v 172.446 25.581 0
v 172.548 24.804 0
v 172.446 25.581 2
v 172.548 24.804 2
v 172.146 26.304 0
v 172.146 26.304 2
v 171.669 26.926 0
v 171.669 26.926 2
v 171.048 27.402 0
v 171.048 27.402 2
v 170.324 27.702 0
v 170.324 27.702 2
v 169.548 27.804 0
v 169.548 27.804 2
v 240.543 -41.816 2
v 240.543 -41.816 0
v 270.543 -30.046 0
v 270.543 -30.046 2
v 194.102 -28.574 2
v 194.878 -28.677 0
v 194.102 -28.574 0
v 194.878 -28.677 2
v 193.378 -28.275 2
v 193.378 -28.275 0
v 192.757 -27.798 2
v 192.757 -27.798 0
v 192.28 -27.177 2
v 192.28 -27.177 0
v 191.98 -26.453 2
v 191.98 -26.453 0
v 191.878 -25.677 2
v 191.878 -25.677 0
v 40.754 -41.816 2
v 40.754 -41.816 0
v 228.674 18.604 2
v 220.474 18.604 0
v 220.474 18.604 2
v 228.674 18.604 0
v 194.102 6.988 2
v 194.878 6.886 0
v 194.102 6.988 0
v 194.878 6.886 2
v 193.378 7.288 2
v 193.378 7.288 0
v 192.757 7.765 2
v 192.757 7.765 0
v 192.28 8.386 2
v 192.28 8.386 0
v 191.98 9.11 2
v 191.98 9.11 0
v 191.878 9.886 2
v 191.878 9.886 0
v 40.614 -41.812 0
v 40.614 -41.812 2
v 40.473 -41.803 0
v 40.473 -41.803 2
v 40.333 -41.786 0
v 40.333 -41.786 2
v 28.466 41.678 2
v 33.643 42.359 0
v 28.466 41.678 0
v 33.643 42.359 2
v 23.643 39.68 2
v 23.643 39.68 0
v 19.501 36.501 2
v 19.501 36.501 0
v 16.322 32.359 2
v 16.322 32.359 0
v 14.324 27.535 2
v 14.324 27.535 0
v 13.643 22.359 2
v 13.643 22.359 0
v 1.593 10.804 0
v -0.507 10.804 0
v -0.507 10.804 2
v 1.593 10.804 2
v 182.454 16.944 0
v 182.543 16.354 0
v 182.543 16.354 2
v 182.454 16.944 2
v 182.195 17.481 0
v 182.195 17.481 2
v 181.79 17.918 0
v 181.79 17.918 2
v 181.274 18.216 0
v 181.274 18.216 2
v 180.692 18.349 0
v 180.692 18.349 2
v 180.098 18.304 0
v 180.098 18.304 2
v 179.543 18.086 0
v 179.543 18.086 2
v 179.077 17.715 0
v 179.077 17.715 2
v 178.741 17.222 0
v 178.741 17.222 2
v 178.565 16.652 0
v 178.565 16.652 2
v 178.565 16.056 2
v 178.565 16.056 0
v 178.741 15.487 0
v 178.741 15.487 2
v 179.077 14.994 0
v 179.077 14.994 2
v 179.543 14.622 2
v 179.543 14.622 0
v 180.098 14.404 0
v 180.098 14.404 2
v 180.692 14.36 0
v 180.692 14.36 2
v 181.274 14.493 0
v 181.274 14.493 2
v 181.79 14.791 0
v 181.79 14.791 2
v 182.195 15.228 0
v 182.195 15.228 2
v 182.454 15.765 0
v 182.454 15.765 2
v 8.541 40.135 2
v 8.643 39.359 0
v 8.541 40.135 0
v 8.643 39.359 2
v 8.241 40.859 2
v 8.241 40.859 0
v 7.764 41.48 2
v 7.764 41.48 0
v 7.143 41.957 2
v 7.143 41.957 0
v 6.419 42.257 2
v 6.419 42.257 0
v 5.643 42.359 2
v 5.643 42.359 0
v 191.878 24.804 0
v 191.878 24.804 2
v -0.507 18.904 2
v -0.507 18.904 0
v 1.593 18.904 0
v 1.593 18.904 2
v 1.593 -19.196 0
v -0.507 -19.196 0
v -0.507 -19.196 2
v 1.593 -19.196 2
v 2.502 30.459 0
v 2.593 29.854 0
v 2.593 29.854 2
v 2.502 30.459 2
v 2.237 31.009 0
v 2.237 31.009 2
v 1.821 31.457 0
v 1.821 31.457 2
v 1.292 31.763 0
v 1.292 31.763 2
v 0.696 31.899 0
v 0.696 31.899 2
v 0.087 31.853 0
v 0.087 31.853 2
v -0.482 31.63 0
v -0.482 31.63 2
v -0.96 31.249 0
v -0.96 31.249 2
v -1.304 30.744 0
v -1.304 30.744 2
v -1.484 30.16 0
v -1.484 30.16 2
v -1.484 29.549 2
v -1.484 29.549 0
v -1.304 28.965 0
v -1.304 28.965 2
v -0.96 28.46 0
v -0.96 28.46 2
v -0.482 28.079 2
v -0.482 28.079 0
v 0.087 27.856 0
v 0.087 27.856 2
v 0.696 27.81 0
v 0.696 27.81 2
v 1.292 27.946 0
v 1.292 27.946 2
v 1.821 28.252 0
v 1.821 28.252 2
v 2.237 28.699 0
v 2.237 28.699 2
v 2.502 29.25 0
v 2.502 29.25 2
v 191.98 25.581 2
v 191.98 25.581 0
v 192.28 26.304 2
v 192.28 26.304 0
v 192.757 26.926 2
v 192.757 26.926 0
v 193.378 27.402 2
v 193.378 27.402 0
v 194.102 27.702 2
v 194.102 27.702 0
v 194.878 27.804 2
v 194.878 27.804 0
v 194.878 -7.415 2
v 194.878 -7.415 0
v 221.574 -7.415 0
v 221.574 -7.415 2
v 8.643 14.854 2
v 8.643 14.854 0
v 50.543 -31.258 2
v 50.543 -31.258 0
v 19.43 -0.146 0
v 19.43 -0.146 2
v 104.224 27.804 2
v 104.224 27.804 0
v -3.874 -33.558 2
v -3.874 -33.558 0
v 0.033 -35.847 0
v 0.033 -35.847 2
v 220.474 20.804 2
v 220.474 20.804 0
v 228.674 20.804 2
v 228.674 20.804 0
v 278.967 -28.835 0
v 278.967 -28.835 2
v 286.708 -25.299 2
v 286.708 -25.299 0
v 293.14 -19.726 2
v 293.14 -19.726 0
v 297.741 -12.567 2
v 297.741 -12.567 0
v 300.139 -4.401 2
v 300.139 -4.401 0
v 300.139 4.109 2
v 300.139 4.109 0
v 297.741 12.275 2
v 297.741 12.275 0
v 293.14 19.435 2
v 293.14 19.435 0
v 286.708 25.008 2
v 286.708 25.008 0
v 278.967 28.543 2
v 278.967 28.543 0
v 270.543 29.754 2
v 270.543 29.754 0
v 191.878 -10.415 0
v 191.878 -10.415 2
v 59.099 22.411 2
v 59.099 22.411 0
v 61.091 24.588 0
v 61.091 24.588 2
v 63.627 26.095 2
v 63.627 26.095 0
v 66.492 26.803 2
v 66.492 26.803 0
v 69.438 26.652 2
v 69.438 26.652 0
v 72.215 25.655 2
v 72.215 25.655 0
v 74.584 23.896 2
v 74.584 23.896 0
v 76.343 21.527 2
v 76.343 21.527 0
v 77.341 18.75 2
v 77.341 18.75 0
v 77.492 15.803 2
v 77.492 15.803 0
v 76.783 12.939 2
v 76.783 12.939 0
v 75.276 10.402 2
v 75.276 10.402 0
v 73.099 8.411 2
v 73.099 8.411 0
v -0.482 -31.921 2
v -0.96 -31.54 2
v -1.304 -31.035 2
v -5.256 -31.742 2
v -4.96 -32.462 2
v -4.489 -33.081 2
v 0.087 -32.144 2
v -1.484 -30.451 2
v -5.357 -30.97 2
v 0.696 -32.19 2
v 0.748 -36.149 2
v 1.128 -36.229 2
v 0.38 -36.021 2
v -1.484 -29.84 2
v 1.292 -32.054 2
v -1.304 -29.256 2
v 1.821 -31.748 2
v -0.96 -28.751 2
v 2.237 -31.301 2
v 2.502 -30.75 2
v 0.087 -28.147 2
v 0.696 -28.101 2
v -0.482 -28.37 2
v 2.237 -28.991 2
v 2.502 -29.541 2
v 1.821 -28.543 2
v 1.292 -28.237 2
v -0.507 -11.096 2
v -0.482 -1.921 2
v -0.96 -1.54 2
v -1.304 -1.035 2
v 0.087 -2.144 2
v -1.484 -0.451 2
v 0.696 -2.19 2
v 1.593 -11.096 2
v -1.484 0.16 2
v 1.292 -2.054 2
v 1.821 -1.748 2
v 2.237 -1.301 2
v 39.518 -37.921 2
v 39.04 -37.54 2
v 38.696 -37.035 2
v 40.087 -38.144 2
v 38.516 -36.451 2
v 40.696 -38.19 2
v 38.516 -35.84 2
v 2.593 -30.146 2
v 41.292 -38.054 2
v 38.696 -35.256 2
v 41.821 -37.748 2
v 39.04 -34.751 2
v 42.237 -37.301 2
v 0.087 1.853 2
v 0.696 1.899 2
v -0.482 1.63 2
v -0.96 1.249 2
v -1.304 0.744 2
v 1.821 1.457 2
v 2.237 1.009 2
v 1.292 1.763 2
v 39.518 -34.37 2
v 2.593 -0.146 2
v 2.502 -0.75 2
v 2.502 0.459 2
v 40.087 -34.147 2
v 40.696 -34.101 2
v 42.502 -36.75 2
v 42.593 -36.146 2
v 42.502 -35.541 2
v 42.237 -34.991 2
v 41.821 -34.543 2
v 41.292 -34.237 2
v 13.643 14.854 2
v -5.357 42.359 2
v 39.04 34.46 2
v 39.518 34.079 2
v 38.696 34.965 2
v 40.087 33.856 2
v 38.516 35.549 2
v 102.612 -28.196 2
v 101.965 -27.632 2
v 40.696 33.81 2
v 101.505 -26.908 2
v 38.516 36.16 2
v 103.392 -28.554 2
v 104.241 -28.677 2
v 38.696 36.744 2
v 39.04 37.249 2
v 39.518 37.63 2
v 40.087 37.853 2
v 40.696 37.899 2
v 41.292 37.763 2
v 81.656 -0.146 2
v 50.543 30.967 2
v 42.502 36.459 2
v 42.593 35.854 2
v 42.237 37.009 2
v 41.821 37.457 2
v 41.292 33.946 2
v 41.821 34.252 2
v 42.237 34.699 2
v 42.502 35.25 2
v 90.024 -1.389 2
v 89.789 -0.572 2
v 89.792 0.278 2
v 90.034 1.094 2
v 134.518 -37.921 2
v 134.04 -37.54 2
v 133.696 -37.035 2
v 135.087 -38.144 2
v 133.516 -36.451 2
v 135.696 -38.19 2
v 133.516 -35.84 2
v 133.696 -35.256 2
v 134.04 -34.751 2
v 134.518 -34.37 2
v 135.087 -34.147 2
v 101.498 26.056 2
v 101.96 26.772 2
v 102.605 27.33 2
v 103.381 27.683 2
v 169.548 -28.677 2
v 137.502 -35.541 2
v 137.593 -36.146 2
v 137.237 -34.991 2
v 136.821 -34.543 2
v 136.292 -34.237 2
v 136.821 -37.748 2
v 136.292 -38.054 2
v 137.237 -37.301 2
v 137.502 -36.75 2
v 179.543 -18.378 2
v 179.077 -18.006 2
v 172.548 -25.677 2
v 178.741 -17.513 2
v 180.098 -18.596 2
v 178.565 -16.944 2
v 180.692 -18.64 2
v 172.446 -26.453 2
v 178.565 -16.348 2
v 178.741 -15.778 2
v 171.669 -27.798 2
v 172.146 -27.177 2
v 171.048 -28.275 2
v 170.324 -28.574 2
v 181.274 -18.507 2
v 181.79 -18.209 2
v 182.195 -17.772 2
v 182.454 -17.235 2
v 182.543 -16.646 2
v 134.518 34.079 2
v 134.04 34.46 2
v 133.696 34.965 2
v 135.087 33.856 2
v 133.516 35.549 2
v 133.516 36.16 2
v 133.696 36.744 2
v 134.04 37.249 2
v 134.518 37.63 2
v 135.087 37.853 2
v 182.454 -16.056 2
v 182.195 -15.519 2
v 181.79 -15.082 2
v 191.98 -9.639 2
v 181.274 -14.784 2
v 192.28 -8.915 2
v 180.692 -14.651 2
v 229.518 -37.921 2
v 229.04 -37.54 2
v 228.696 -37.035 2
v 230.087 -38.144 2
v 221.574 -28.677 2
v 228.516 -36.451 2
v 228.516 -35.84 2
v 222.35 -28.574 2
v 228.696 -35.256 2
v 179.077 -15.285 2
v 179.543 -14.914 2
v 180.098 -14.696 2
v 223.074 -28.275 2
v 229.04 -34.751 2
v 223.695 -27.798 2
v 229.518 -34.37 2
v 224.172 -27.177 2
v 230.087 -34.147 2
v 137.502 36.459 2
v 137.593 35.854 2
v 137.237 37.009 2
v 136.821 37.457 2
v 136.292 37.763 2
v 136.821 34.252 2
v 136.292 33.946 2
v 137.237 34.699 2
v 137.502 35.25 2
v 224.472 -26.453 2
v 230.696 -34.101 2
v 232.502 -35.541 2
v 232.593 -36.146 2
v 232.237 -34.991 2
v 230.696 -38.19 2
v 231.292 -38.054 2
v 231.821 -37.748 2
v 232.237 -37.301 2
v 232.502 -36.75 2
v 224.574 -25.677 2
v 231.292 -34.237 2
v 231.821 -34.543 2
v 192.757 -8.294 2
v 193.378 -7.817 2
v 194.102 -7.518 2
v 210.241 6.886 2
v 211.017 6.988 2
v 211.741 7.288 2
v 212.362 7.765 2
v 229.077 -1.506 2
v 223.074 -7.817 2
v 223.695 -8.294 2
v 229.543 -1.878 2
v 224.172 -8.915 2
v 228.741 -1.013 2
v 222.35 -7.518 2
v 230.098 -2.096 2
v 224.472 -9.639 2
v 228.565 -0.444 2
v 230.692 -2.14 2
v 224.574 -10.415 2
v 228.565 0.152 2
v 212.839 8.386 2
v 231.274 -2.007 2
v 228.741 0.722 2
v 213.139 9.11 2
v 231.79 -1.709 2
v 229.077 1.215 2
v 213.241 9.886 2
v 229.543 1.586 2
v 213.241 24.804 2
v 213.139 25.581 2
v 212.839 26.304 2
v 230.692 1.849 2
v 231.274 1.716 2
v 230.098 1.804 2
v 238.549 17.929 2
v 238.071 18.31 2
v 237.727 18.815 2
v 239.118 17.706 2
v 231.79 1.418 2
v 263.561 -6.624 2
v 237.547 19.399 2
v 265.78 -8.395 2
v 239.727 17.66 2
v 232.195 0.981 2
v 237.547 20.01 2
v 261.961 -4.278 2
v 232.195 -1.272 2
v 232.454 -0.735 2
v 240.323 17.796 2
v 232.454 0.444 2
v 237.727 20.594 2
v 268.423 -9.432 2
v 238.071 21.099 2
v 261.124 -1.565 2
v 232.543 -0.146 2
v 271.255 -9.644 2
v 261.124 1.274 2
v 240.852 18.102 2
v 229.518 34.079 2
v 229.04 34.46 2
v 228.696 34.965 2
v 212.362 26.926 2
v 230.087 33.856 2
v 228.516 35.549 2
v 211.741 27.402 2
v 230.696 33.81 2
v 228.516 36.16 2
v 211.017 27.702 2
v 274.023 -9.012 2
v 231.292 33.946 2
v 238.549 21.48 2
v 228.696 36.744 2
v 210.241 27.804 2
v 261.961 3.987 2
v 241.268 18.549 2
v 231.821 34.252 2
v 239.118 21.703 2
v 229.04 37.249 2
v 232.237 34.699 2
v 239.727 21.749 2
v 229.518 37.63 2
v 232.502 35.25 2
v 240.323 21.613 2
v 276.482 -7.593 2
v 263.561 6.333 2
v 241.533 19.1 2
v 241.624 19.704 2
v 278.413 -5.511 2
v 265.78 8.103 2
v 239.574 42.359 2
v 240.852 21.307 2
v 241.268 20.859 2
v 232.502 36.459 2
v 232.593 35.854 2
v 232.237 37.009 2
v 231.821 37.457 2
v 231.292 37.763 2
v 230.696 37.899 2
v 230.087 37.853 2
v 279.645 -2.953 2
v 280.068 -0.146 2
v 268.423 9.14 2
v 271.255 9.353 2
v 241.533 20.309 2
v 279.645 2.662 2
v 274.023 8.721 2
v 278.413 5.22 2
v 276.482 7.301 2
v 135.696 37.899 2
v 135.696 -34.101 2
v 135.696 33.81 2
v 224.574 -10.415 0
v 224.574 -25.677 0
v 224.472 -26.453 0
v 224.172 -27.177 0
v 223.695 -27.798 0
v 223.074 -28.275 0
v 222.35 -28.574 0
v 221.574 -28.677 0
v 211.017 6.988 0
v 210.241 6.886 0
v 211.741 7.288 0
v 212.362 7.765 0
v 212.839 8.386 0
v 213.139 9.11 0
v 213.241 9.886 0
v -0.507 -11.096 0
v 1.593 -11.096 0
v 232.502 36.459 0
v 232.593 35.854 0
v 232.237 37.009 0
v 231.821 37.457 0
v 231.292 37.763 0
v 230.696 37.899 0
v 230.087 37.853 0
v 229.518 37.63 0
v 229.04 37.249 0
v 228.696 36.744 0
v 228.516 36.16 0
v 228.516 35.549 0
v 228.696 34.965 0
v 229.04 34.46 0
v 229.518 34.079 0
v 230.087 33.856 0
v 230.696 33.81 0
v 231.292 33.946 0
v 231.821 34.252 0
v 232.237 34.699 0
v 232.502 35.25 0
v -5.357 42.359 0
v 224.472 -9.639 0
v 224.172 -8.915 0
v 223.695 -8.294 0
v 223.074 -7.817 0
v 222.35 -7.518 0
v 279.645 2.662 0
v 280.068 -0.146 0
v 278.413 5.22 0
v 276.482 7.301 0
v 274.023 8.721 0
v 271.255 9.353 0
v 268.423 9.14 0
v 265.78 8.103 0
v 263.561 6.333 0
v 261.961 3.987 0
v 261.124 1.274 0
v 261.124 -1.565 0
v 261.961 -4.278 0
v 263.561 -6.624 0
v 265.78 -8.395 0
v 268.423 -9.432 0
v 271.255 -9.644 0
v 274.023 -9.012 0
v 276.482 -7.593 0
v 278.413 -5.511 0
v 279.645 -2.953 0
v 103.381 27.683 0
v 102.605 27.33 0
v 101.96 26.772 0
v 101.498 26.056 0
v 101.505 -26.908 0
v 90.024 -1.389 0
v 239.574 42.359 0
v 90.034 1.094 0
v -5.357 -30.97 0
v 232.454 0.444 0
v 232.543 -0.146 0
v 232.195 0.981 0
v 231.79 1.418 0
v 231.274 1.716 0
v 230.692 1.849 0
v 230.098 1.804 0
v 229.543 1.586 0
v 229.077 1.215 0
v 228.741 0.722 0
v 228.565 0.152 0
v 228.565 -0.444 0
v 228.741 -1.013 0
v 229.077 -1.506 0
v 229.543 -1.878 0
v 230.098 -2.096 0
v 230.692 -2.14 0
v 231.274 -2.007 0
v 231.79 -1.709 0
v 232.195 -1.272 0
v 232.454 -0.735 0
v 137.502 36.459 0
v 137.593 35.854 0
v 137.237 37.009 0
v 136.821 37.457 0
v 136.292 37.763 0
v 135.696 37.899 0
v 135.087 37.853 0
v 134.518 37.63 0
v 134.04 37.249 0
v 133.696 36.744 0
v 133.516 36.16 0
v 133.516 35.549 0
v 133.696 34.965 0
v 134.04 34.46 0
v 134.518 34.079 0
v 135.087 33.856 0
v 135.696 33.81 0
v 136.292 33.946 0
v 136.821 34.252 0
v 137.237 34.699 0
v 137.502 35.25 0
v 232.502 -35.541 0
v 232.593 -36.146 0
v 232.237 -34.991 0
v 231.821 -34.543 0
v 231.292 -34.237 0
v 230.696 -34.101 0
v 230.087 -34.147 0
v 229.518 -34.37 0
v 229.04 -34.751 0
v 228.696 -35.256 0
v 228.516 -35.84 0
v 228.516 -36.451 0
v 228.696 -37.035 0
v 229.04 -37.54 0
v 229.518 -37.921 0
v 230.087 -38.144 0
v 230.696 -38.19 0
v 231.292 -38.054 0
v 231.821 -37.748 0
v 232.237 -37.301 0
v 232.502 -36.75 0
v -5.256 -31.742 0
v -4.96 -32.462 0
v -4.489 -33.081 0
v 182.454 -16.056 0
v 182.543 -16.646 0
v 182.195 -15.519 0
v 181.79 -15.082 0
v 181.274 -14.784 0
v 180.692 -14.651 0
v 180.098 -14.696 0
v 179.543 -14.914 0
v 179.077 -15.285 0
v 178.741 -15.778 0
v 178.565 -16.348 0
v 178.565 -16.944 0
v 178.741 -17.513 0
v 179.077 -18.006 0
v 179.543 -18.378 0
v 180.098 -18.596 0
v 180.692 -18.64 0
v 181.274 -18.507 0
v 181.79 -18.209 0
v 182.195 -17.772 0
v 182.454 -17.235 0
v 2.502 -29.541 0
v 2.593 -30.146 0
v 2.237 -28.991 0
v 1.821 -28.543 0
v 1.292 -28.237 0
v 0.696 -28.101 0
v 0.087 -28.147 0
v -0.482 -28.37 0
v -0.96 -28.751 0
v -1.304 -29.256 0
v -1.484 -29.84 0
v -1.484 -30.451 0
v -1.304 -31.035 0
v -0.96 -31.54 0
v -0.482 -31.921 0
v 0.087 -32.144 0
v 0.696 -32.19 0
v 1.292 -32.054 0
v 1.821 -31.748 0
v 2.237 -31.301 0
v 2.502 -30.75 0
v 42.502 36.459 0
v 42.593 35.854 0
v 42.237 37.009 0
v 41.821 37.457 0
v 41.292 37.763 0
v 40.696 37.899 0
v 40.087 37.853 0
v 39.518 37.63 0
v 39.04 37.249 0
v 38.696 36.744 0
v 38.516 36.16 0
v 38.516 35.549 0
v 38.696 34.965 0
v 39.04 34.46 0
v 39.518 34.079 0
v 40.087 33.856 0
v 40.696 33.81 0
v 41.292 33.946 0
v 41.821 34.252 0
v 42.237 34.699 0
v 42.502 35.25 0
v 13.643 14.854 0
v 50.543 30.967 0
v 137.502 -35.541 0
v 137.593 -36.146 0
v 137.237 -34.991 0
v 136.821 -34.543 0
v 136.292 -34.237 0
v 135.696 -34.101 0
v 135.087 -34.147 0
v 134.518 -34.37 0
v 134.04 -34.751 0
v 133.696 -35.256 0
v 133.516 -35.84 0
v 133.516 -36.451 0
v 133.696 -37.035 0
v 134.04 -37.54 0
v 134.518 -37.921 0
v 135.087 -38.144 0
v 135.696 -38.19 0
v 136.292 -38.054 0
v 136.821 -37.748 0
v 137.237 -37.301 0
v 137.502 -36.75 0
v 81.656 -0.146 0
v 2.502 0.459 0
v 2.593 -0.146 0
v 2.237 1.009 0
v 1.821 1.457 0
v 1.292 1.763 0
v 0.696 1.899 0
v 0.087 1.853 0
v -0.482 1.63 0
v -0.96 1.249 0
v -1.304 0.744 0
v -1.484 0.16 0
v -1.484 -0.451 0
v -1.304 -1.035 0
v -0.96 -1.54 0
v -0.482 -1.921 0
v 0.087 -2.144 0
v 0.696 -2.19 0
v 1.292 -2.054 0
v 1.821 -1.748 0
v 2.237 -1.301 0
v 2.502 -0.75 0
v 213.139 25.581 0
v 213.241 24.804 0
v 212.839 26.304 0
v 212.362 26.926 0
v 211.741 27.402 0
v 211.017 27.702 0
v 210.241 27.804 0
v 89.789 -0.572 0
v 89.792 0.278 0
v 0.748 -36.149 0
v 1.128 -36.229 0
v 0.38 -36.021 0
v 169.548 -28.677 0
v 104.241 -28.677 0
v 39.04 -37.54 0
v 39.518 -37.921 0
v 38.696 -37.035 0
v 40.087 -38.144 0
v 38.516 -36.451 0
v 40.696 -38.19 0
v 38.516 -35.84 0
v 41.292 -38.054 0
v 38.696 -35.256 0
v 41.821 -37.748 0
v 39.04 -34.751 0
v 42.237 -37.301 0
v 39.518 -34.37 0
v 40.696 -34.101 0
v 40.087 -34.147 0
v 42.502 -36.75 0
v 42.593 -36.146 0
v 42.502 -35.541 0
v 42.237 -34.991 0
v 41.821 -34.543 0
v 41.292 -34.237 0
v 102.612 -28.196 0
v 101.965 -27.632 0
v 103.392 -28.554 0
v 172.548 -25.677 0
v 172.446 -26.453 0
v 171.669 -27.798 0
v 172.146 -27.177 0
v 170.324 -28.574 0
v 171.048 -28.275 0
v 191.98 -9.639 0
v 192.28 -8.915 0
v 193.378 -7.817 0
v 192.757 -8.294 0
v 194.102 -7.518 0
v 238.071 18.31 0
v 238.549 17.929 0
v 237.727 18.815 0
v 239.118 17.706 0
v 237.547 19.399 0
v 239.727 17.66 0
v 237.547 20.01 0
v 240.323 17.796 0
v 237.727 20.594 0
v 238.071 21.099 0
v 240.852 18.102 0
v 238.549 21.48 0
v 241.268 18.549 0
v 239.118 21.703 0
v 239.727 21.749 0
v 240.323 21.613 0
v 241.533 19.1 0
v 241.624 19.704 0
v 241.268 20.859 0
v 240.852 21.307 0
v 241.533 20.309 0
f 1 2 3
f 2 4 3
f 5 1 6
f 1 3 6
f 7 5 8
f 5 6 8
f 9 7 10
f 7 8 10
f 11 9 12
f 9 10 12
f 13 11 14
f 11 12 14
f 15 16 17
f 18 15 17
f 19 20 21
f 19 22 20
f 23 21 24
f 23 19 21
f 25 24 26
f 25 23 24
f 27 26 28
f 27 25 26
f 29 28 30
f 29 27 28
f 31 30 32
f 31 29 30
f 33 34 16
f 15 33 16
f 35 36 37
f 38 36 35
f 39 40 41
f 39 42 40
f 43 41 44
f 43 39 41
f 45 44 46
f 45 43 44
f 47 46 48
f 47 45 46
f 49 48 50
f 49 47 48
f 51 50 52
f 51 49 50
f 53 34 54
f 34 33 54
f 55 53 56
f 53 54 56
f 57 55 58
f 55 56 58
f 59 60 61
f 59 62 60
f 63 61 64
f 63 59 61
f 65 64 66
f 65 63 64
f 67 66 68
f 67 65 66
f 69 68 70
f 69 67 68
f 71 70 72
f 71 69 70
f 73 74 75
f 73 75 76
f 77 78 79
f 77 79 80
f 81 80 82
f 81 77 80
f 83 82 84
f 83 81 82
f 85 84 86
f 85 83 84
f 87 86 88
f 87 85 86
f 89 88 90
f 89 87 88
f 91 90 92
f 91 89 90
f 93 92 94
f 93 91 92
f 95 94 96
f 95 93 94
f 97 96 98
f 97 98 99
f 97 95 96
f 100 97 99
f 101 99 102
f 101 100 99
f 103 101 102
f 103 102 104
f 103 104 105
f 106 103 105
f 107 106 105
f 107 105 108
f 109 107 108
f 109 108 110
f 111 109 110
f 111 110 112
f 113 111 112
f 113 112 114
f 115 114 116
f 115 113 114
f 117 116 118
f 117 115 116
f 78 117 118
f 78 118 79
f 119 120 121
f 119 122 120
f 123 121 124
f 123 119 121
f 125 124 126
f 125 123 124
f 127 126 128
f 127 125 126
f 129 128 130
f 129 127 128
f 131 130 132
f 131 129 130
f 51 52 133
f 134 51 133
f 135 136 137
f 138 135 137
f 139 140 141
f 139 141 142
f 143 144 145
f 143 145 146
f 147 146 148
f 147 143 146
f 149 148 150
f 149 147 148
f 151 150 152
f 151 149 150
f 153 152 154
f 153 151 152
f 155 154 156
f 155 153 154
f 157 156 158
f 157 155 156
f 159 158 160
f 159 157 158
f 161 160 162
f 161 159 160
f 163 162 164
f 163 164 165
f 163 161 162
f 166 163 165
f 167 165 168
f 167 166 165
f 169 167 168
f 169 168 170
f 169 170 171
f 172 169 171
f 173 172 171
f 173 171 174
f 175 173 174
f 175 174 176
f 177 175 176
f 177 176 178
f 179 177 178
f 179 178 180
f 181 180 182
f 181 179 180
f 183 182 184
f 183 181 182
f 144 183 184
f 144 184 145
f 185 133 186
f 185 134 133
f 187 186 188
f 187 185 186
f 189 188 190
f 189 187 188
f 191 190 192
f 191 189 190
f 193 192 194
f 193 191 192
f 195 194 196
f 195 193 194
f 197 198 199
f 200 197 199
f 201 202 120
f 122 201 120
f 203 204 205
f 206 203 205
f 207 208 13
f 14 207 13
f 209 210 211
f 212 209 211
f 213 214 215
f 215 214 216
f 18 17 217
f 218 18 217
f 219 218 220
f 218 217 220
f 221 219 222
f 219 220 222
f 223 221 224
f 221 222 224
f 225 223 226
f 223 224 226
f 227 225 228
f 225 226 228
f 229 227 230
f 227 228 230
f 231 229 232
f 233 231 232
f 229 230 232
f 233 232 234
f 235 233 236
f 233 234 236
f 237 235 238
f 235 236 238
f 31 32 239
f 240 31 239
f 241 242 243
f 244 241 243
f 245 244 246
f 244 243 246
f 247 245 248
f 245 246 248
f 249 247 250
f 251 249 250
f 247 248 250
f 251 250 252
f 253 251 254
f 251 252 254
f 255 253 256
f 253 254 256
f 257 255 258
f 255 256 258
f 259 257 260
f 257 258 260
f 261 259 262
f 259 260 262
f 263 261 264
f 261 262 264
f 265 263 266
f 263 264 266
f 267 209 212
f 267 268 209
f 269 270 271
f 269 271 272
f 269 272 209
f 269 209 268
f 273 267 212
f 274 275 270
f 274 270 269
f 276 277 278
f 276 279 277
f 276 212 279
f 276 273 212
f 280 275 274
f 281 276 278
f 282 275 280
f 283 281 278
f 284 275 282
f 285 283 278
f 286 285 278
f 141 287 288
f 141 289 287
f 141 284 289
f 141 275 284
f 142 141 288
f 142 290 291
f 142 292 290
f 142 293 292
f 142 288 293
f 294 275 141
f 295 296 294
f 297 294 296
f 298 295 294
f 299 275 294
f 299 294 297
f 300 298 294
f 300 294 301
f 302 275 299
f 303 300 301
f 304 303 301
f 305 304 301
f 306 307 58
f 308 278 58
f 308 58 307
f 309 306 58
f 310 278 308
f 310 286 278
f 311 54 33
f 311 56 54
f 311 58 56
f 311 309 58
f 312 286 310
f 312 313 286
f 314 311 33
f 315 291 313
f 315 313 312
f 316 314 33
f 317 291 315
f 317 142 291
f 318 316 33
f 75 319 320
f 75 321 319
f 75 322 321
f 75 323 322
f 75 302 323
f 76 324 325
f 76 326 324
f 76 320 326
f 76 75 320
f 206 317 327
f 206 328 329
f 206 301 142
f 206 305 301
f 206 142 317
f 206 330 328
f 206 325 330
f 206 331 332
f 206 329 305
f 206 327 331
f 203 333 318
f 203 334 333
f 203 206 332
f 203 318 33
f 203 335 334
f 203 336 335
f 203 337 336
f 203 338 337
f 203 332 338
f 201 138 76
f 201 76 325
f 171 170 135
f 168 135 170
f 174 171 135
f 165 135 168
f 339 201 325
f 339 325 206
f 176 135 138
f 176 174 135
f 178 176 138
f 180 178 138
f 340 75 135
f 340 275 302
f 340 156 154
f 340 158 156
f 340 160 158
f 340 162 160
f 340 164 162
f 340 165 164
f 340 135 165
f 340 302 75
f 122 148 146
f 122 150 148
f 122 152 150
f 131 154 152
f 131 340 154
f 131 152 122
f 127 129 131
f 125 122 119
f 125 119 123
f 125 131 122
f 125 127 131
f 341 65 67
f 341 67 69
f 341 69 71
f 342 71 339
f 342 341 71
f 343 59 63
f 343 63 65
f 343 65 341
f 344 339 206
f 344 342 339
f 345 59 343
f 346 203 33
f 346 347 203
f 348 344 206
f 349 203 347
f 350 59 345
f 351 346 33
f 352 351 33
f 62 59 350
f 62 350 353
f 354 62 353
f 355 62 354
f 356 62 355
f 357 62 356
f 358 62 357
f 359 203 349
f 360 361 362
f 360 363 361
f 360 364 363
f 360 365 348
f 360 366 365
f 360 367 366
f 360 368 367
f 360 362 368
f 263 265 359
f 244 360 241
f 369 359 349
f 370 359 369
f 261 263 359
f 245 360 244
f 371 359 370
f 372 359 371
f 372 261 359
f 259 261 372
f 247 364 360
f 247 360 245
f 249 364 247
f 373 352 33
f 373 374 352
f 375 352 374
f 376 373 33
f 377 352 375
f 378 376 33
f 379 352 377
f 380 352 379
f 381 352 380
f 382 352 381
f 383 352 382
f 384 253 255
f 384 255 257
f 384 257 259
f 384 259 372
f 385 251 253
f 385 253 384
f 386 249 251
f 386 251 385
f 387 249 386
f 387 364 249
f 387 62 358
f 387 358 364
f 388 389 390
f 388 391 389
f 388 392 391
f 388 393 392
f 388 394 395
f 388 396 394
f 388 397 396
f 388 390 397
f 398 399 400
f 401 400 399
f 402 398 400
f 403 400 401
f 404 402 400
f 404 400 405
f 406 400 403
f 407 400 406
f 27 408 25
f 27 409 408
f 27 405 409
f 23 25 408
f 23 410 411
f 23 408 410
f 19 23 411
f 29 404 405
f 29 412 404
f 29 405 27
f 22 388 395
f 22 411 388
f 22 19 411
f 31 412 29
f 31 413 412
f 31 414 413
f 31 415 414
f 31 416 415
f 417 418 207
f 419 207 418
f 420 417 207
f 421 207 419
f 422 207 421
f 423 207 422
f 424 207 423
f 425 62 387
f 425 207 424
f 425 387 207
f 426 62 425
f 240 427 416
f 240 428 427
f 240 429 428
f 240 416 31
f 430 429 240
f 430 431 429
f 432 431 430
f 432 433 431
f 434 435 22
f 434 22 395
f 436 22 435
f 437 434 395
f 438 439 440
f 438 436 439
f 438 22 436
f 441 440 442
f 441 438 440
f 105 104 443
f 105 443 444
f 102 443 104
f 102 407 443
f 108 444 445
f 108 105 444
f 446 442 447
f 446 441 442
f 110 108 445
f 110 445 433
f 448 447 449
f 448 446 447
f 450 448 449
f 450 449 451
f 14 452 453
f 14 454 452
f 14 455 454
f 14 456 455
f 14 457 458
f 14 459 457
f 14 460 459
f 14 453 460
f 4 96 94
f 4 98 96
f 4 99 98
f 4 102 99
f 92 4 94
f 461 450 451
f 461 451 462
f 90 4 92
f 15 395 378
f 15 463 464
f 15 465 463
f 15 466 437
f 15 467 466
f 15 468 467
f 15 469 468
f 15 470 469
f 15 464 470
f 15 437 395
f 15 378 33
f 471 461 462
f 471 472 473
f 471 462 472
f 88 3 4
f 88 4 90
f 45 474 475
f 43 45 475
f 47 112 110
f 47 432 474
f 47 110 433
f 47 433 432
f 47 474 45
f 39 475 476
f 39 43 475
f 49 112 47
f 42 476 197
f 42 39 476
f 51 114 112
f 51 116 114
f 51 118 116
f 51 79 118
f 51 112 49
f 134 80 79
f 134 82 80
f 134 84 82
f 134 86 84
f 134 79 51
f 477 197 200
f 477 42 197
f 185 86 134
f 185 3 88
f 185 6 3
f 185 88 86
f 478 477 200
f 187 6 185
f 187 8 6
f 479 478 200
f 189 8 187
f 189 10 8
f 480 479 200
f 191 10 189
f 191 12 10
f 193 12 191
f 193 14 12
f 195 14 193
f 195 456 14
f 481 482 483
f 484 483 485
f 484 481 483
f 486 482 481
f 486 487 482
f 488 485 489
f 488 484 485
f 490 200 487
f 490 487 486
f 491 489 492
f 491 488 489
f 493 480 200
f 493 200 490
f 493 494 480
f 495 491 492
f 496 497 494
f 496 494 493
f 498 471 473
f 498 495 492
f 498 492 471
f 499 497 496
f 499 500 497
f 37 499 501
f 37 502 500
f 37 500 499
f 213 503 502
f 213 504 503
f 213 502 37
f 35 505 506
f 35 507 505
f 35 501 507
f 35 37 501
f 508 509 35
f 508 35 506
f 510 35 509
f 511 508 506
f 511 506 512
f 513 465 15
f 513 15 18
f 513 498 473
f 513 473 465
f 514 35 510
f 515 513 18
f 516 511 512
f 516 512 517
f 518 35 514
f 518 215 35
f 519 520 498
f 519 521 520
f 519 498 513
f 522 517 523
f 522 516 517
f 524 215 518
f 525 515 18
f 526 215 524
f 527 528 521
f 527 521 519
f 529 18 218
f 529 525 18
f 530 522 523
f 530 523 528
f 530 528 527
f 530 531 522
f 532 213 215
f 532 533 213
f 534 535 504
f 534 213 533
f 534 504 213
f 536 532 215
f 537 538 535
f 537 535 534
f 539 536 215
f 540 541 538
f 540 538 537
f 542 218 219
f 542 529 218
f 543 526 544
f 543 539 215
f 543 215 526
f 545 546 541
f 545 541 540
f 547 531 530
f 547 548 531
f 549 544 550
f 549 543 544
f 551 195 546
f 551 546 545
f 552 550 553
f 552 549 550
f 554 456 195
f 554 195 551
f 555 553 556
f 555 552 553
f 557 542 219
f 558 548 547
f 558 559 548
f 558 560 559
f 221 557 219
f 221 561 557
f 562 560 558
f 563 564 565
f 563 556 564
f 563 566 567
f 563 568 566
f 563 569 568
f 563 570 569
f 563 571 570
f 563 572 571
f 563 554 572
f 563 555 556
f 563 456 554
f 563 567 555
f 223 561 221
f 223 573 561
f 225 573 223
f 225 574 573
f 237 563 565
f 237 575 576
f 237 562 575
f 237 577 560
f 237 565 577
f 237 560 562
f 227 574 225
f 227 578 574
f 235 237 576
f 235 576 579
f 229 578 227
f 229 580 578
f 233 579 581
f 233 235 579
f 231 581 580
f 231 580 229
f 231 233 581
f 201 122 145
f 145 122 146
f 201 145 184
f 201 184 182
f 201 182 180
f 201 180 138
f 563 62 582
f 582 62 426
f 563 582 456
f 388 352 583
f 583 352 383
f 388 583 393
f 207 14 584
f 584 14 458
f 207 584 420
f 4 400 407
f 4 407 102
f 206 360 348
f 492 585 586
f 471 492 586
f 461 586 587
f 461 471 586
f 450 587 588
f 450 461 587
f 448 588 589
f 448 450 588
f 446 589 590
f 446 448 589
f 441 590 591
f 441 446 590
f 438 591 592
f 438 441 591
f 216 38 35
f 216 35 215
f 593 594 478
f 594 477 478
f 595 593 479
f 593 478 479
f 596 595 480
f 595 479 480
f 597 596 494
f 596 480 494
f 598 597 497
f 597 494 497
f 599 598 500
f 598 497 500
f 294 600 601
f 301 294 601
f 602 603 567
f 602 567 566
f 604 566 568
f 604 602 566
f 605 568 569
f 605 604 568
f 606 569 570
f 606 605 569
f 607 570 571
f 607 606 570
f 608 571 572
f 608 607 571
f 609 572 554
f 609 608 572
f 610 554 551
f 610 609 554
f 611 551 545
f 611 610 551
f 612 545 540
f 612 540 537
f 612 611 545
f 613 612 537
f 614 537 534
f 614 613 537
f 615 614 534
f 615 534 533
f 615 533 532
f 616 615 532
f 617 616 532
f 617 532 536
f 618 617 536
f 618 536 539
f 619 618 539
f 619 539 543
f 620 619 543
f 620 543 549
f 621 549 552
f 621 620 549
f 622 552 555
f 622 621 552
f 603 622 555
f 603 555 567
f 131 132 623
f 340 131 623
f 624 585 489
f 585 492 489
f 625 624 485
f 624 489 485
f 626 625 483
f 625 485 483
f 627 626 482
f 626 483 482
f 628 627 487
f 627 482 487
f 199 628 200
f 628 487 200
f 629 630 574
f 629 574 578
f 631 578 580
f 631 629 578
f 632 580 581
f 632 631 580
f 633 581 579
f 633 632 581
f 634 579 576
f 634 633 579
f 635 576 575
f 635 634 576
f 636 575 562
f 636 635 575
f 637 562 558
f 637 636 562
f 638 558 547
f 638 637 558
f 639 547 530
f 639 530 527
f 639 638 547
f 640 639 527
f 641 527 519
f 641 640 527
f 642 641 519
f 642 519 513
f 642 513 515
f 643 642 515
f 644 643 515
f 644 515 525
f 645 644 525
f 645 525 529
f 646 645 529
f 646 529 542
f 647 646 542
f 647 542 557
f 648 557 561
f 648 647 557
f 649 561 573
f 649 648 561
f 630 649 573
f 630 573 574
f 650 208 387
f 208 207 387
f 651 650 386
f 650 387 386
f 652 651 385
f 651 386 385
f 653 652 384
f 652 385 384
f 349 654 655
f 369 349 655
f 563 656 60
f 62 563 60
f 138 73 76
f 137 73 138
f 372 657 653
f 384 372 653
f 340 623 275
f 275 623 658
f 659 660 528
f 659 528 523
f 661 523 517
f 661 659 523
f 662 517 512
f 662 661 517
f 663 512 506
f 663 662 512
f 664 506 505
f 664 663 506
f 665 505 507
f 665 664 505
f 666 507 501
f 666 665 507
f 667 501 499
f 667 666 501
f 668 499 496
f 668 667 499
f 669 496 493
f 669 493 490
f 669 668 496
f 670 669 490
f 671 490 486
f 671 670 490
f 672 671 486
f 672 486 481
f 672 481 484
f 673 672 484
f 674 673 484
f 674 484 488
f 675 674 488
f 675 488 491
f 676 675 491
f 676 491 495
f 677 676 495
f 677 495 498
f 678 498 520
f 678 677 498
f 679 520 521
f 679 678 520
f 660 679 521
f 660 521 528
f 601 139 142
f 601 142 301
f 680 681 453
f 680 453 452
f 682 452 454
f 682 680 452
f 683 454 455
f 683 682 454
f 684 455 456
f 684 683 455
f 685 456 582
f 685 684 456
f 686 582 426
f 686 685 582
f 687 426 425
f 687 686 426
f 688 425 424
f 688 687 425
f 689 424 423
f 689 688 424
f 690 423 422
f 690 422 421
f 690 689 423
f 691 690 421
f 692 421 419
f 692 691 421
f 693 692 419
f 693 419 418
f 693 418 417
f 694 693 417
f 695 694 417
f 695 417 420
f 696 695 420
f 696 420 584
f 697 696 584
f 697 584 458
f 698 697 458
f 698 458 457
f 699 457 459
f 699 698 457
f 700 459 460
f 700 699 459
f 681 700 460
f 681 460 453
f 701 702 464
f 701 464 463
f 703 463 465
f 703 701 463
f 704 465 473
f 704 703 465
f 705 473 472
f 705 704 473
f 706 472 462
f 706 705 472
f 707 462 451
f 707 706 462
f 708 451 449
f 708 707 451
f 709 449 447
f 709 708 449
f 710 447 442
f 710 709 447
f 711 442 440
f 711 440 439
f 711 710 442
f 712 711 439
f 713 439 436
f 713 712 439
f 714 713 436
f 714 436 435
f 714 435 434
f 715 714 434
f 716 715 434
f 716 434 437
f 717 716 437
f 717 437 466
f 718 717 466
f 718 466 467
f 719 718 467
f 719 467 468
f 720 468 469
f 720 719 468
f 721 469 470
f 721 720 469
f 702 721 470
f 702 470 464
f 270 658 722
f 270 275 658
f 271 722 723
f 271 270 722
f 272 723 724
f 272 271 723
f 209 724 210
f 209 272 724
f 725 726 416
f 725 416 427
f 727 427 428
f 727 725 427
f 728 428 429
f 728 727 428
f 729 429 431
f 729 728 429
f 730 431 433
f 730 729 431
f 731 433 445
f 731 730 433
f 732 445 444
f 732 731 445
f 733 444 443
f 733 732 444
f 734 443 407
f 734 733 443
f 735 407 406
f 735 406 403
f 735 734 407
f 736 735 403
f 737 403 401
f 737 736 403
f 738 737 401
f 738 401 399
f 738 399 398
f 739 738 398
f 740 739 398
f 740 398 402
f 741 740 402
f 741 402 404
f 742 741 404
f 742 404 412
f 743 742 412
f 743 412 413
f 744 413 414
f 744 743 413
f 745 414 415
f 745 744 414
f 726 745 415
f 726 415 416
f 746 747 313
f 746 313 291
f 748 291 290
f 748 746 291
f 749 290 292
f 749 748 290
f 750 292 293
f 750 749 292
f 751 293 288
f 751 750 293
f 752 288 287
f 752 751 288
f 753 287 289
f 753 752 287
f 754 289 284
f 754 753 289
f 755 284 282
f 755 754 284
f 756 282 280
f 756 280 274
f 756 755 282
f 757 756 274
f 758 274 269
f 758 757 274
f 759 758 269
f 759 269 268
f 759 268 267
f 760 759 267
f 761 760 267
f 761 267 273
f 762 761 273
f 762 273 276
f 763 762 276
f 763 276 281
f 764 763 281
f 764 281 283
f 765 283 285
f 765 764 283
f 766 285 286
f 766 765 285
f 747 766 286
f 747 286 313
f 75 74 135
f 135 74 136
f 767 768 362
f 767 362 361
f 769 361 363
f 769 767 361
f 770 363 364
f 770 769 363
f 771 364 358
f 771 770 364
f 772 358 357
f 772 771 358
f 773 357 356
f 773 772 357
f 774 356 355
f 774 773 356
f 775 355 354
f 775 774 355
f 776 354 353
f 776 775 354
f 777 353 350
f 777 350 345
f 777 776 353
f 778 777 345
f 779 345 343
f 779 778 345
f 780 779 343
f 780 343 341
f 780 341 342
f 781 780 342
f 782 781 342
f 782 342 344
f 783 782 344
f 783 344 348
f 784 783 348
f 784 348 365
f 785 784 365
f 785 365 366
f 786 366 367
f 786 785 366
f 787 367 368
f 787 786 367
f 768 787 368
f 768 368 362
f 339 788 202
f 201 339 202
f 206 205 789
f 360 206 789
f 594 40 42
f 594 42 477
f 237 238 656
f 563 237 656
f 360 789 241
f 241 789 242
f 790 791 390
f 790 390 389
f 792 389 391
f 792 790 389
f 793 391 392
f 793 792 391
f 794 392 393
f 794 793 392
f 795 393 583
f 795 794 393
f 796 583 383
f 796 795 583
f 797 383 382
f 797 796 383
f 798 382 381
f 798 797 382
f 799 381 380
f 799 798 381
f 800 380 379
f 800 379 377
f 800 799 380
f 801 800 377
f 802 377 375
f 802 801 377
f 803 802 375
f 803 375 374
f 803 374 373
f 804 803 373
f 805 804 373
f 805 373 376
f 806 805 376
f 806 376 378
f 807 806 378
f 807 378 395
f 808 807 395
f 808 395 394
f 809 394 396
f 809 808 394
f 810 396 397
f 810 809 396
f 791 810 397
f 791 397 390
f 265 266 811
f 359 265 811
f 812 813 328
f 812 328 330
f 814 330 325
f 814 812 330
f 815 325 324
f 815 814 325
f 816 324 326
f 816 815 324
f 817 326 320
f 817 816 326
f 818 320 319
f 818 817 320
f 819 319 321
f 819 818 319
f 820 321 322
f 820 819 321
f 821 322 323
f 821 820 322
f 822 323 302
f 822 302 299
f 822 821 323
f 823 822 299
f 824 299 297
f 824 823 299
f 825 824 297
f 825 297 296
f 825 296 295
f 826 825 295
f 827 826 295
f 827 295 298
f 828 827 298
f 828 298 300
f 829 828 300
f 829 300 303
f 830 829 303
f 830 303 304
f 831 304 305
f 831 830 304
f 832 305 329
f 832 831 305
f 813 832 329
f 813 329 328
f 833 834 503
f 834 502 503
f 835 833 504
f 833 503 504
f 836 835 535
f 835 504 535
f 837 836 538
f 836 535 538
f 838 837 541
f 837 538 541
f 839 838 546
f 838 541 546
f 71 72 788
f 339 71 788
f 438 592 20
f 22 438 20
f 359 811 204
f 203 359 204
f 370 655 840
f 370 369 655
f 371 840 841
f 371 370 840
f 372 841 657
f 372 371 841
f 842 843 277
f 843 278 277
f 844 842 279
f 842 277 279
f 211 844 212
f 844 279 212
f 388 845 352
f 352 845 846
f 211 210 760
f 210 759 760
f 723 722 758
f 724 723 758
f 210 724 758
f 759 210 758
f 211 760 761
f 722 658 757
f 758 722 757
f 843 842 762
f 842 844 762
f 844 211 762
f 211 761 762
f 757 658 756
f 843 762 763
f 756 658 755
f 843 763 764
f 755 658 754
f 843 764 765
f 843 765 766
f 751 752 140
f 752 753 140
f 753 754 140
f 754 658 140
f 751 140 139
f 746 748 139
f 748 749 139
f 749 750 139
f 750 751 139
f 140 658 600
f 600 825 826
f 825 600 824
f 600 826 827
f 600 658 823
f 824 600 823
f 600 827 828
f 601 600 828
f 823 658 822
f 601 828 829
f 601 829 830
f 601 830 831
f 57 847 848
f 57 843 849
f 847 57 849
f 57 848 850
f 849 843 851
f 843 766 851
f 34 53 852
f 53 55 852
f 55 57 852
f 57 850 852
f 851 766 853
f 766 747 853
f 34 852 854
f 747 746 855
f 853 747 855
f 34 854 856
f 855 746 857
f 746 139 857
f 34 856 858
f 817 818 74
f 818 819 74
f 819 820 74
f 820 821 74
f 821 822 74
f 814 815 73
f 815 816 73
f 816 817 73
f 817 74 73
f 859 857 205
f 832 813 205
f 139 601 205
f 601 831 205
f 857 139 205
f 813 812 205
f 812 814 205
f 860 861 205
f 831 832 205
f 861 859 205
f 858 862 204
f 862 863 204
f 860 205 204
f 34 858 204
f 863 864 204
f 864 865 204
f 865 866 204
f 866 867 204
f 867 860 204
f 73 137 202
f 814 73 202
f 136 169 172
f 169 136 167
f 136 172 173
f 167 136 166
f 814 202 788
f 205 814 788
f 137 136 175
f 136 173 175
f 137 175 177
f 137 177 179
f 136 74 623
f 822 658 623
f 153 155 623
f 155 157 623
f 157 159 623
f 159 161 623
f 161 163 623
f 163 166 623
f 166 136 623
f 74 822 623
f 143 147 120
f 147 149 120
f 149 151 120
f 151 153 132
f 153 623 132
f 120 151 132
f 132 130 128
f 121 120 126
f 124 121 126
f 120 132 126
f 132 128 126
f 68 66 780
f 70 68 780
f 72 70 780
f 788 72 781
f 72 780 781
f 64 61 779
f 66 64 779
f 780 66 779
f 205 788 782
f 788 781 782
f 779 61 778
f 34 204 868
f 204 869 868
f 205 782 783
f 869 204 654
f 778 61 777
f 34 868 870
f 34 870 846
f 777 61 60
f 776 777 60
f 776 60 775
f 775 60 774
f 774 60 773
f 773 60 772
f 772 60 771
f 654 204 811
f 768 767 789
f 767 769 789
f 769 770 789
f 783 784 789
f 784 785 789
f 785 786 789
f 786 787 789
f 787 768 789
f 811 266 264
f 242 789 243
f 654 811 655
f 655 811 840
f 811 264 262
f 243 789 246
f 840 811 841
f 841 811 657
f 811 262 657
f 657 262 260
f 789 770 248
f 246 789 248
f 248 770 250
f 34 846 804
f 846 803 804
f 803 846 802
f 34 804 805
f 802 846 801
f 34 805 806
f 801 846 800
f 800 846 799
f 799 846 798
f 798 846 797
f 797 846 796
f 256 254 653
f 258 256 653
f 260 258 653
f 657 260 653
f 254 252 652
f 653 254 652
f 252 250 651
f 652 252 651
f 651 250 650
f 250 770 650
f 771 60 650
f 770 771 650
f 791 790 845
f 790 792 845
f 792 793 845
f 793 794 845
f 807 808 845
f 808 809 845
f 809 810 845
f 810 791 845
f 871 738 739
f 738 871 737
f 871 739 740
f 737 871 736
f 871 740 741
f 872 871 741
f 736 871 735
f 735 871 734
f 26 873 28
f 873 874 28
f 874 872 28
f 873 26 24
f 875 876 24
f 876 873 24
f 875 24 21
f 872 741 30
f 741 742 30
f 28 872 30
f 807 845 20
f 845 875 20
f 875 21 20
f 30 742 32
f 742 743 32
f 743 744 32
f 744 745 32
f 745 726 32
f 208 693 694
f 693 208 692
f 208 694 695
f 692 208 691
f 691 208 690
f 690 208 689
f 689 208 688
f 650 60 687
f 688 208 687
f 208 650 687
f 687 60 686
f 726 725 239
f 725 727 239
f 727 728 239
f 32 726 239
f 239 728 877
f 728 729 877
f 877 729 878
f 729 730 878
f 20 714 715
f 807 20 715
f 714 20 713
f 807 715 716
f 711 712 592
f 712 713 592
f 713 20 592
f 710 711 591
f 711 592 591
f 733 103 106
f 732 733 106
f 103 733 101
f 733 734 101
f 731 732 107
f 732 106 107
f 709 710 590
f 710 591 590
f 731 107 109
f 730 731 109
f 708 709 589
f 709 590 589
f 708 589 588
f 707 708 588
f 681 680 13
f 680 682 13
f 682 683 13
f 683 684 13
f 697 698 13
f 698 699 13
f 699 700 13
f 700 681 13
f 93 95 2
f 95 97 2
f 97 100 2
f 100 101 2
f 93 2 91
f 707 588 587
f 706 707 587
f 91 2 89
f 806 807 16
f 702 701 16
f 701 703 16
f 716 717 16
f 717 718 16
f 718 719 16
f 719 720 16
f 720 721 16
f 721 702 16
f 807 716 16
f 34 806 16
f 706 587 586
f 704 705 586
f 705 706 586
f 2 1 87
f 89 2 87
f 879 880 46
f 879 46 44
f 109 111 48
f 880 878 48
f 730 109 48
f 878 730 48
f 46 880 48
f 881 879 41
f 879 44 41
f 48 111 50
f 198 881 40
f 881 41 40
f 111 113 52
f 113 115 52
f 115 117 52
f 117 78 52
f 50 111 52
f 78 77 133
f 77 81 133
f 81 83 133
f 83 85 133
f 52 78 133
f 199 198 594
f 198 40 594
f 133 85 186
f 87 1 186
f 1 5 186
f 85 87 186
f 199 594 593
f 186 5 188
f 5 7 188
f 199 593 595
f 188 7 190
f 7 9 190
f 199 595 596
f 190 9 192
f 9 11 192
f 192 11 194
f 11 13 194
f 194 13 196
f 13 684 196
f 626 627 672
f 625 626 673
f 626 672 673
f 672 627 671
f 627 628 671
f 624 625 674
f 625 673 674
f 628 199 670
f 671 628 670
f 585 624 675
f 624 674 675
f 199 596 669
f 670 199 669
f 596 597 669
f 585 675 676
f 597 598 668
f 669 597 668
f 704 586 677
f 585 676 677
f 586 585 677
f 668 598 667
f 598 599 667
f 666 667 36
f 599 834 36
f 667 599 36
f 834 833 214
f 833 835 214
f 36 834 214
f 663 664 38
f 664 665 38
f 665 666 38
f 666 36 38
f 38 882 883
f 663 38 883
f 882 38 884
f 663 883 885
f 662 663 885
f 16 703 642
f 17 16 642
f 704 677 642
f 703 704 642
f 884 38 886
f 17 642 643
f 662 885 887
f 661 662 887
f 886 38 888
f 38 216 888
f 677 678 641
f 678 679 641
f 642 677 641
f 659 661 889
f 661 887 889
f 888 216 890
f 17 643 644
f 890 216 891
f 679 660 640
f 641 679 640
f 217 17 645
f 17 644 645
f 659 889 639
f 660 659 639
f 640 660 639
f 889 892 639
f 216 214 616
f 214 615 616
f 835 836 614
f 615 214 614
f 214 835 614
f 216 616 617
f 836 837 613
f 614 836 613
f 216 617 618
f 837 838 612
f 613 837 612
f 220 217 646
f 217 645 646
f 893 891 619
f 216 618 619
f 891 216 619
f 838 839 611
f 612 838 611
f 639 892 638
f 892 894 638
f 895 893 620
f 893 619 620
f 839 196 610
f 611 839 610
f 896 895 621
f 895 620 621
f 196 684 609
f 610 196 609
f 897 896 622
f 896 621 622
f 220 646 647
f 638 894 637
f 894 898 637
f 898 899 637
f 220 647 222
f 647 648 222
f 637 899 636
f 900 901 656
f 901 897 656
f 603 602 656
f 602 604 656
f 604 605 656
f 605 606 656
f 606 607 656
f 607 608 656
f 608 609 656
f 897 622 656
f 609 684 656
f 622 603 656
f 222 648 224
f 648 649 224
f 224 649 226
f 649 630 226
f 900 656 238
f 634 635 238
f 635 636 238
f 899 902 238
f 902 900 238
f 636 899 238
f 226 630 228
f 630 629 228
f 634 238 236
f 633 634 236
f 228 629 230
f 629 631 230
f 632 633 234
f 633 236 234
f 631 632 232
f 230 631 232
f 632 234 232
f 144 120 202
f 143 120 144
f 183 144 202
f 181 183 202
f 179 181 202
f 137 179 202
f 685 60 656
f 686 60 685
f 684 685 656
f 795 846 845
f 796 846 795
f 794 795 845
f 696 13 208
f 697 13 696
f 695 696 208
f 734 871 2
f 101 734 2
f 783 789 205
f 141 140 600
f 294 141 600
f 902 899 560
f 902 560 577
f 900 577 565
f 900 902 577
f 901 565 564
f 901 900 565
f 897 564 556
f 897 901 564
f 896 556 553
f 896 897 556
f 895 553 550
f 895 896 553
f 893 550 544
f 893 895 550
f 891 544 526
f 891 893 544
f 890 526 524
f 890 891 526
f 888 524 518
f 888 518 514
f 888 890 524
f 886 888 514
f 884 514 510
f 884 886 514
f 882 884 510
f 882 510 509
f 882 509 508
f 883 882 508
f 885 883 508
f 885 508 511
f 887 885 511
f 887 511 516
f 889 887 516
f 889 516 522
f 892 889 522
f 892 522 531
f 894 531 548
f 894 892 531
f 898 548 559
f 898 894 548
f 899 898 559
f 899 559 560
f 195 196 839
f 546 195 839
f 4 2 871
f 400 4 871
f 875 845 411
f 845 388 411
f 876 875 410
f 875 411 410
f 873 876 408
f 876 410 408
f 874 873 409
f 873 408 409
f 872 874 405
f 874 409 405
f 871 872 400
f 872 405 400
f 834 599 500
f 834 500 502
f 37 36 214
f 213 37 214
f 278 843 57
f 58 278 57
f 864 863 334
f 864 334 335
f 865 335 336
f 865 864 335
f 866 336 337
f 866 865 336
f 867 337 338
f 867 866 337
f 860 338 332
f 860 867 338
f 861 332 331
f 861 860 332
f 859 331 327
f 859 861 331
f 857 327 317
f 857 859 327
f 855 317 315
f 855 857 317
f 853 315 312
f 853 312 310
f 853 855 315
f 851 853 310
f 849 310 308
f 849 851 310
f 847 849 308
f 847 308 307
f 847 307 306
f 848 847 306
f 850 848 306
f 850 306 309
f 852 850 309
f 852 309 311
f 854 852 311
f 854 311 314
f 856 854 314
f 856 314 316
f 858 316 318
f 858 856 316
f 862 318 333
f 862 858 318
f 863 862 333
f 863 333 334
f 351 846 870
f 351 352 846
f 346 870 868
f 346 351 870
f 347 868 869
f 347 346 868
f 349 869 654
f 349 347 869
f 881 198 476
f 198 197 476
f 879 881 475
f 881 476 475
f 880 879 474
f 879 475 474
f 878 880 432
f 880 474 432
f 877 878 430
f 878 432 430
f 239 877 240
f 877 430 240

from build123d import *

# Parameters (mm, degrees)
SKETCH_1_R      = 2.05
SKETCH_1_W      = 2.1
SKETCH_1_H      = 8.1
SKETCH_1_R_2    = 2
SKETCH_1_R_3    = 9.525
SKETCH_1_W_2    = 21.362756018
SKETCH_1_H_2    = 20.918096029
SKETCH_1_W_3    = 8.2
SKETCH_1_H_3    = 2.2
EXTRUDE_1_DEPTH = 2
FILLET_1_R      = 3
FILLET_2_R      = 20
FILLET_4_R      = 3


with BuildPart() as part:
    # 草图1 → 凸台-拉伸1 (new body)
    with BuildSketch(Plane.XY):
        with BuildLine():
            Line((240.542857143, -41.815743938), (270.542857143, -30.045714286))
            ThreePointArc((270.542857143, -30.045714286), (300.442857143, -0.145714286), (270.542857143, 29.754285714))
            Line((270.542857143, 29.754285714), (239.574018739, 42.359033922))
            Line((239.574018739, 42.359033922), (13.642857143, 42.359033922))
            Line((13.642857143, 42.359033922), (13.642857143, 14.854285714))
            Line((13.642857143, 14.854285714), (8.642857143, 14.854285714))
            Line((8.642857143, 14.854285714), (8.642857143, 42.359033922))
            Line((8.642857143, 42.359033922), (-5.357142857, 42.359033922))
            Line((-5.357142857, 42.359033922), (-5.357142857, -32.689201643))
            Line((-5.357142857, -32.689201643), (0.542857143, -36.145714286))
            Line((0.542857143, -36.145714286), (40.542857143, -41.815743938))
            Line((40.542857143, -41.815743938), (240.542857143, -41.815743938))
        make_face()
        with Locations((40.542857143, -36.145714286)):
            Circle(SKETCH_1_R, mode=Mode.SUBTRACT)
        with Locations((0.542857143, -30.145714286)):
            Circle(SKETCH_1_R, mode=Mode.SUBTRACT)
        with Locations((135.542857143, -36.145714286)):
            Circle(SKETCH_1_R, mode=Mode.SUBTRACT)
        with Locations((0.542857143, -15.145714286)):
            Rectangle(SKETCH_1_W, SKETCH_1_H, mode=Mode.SUBTRACT)
        with Locations((0.542857143, -0.145714286)):
            Circle(SKETCH_1_R, mode=Mode.SUBTRACT)
        with BuildLine():
            Line((50.542857143, 30.966984086), (59.099206329, 22.4106349))
            ThreePointArc((59.099206329, 22.4106349), (74.584487703, 23.895916275), (73.099206329, 8.4106349))
            Line((73.099206329, 8.4106349), (81.655555515, -0.145714286))
            Line((81.655555515, -0.145714286), (50.542857143, -31.258412658))
            Line((50.542857143, -31.258412658), (19.430158771, -0.145714286))
            Line((19.430158771, -0.145714286), (50.542857143, 30.966984086))
        make_face(mode=Mode.SUBTRACT)
        Polygon((102.300999077, -28.676695157), (89.464558906, -0.145714286), (102.300999077, 27.804285714), (172.548041202, 27.804285714), (172.548041202, -28.676695157), align=None, mode=Mode.SUBTRACT)
        with Locations((230.542857143, -36.145714286)):
            Circle(SKETCH_1_R, mode=Mode.SUBTRACT)
        with Locations((180.542857143, -16.645714286)):
            Circle(SKETCH_1_R_2, mode=Mode.SUBTRACT)
        Polygon((224.574018739, -28.676695157), (213.241022587, -28.676695157), (191.878266569, -28.676695157), (191.878266569, -7.415485794), (224.574018739, -7.415485794), align=None, mode=Mode.SUBTRACT)
        with Locations((230.542857143, -0.145714286)):
            Circle(SKETCH_1_R_2, mode=Mode.SUBTRACT)
        with Locations((270.542857143, -0.145714286)):
            Circle(SKETCH_1_R_3, mode=Mode.SUBTRACT)
        with Locations((0.542857143, 14.854285714)):
            Rectangle(SKETCH_1_W, SKETCH_1_H, mode=Mode.SUBTRACT)
        with Locations((0.542857143, 29.854285714)):
            Circle(SKETCH_1_R, mode=Mode.SUBTRACT)
        with Locations((40.542857143, 35.854285714)):
            Circle(SKETCH_1_R, mode=Mode.SUBTRACT)
        with Locations((135.542857143, 35.854285714)):
            Circle(SKETCH_1_R, mode=Mode.SUBTRACT)
        with Locations((180.542857143, 16.354285714)):
            Circle(SKETCH_1_R_2, mode=Mode.SUBTRACT)
        with Locations((202.559644578, 17.3452377)):
            Rectangle(SKETCH_1_W_2, SKETCH_1_H_2, mode=Mode.SUBTRACT)
        with Locations((224.574018739, 19.704285714)):
            Rectangle(SKETCH_1_W_3, SKETCH_1_H_3, mode=Mode.SUBTRACT)
        with Locations((239.574018739, 19.704285714)):
            Circle(SKETCH_1_R, mode=Mode.SUBTRACT)
        with Locations((230.542857143, 35.854285714)):
            Circle(SKETCH_1_R, mode=Mode.SUBTRACT)
    extrude(amount=EXTRUDE_1_DEPTH)

    # 圆角1
    fillet_1_edges = [part.edges().sort_by_distance(p)[0] for p in [
        (224.574018739, -7.415485794, 1),
        (191.878266569, -7.415485794, 1),
        (191.878266569, -28.676695157, 1),
        (224.574018739, -28.676695157, 1),
        (172.548041202, -28.676695157, 1),
        (172.548041202, 27.804285714, 1),
        (102.300999077, 27.804285714, 1),
        (89.464558906, -0.145714286, 1),
        (102.300999077, -28.676695157, 1),
        (191.878266569, 27.804285714, 1),
        (191.878266569, 6.886189685, 1),
        (213.241022587, 6.886189685, 1),
        (213.241022587, 27.804285714, 1),
    ]]
    fillet(fillet_1_edges, radius=FILLET_1_R)

    # 圆角2
    fillet_2_edges = [part.edges().sort_by_distance(p)[0] for p in [
        (13.642857143, 42.359033922, 1),
    ]]
    fillet(fillet_2_edges, radius=FILLET_2_R)

    # 圆角4
    fillet_4_edges = [part.edges().sort_by_distance(p)[0] for p in [
        (40.542857143, -41.815743938, 1),
        (0.542857143, -36.145714286, 1),
        (-5.357142857, -32.689201643, 1),
        (8.642857143, 42.359033922, 1),
    ]]
    fillet(fillet_4_edges, radius=FILLET_4_R)


solid = part.part
